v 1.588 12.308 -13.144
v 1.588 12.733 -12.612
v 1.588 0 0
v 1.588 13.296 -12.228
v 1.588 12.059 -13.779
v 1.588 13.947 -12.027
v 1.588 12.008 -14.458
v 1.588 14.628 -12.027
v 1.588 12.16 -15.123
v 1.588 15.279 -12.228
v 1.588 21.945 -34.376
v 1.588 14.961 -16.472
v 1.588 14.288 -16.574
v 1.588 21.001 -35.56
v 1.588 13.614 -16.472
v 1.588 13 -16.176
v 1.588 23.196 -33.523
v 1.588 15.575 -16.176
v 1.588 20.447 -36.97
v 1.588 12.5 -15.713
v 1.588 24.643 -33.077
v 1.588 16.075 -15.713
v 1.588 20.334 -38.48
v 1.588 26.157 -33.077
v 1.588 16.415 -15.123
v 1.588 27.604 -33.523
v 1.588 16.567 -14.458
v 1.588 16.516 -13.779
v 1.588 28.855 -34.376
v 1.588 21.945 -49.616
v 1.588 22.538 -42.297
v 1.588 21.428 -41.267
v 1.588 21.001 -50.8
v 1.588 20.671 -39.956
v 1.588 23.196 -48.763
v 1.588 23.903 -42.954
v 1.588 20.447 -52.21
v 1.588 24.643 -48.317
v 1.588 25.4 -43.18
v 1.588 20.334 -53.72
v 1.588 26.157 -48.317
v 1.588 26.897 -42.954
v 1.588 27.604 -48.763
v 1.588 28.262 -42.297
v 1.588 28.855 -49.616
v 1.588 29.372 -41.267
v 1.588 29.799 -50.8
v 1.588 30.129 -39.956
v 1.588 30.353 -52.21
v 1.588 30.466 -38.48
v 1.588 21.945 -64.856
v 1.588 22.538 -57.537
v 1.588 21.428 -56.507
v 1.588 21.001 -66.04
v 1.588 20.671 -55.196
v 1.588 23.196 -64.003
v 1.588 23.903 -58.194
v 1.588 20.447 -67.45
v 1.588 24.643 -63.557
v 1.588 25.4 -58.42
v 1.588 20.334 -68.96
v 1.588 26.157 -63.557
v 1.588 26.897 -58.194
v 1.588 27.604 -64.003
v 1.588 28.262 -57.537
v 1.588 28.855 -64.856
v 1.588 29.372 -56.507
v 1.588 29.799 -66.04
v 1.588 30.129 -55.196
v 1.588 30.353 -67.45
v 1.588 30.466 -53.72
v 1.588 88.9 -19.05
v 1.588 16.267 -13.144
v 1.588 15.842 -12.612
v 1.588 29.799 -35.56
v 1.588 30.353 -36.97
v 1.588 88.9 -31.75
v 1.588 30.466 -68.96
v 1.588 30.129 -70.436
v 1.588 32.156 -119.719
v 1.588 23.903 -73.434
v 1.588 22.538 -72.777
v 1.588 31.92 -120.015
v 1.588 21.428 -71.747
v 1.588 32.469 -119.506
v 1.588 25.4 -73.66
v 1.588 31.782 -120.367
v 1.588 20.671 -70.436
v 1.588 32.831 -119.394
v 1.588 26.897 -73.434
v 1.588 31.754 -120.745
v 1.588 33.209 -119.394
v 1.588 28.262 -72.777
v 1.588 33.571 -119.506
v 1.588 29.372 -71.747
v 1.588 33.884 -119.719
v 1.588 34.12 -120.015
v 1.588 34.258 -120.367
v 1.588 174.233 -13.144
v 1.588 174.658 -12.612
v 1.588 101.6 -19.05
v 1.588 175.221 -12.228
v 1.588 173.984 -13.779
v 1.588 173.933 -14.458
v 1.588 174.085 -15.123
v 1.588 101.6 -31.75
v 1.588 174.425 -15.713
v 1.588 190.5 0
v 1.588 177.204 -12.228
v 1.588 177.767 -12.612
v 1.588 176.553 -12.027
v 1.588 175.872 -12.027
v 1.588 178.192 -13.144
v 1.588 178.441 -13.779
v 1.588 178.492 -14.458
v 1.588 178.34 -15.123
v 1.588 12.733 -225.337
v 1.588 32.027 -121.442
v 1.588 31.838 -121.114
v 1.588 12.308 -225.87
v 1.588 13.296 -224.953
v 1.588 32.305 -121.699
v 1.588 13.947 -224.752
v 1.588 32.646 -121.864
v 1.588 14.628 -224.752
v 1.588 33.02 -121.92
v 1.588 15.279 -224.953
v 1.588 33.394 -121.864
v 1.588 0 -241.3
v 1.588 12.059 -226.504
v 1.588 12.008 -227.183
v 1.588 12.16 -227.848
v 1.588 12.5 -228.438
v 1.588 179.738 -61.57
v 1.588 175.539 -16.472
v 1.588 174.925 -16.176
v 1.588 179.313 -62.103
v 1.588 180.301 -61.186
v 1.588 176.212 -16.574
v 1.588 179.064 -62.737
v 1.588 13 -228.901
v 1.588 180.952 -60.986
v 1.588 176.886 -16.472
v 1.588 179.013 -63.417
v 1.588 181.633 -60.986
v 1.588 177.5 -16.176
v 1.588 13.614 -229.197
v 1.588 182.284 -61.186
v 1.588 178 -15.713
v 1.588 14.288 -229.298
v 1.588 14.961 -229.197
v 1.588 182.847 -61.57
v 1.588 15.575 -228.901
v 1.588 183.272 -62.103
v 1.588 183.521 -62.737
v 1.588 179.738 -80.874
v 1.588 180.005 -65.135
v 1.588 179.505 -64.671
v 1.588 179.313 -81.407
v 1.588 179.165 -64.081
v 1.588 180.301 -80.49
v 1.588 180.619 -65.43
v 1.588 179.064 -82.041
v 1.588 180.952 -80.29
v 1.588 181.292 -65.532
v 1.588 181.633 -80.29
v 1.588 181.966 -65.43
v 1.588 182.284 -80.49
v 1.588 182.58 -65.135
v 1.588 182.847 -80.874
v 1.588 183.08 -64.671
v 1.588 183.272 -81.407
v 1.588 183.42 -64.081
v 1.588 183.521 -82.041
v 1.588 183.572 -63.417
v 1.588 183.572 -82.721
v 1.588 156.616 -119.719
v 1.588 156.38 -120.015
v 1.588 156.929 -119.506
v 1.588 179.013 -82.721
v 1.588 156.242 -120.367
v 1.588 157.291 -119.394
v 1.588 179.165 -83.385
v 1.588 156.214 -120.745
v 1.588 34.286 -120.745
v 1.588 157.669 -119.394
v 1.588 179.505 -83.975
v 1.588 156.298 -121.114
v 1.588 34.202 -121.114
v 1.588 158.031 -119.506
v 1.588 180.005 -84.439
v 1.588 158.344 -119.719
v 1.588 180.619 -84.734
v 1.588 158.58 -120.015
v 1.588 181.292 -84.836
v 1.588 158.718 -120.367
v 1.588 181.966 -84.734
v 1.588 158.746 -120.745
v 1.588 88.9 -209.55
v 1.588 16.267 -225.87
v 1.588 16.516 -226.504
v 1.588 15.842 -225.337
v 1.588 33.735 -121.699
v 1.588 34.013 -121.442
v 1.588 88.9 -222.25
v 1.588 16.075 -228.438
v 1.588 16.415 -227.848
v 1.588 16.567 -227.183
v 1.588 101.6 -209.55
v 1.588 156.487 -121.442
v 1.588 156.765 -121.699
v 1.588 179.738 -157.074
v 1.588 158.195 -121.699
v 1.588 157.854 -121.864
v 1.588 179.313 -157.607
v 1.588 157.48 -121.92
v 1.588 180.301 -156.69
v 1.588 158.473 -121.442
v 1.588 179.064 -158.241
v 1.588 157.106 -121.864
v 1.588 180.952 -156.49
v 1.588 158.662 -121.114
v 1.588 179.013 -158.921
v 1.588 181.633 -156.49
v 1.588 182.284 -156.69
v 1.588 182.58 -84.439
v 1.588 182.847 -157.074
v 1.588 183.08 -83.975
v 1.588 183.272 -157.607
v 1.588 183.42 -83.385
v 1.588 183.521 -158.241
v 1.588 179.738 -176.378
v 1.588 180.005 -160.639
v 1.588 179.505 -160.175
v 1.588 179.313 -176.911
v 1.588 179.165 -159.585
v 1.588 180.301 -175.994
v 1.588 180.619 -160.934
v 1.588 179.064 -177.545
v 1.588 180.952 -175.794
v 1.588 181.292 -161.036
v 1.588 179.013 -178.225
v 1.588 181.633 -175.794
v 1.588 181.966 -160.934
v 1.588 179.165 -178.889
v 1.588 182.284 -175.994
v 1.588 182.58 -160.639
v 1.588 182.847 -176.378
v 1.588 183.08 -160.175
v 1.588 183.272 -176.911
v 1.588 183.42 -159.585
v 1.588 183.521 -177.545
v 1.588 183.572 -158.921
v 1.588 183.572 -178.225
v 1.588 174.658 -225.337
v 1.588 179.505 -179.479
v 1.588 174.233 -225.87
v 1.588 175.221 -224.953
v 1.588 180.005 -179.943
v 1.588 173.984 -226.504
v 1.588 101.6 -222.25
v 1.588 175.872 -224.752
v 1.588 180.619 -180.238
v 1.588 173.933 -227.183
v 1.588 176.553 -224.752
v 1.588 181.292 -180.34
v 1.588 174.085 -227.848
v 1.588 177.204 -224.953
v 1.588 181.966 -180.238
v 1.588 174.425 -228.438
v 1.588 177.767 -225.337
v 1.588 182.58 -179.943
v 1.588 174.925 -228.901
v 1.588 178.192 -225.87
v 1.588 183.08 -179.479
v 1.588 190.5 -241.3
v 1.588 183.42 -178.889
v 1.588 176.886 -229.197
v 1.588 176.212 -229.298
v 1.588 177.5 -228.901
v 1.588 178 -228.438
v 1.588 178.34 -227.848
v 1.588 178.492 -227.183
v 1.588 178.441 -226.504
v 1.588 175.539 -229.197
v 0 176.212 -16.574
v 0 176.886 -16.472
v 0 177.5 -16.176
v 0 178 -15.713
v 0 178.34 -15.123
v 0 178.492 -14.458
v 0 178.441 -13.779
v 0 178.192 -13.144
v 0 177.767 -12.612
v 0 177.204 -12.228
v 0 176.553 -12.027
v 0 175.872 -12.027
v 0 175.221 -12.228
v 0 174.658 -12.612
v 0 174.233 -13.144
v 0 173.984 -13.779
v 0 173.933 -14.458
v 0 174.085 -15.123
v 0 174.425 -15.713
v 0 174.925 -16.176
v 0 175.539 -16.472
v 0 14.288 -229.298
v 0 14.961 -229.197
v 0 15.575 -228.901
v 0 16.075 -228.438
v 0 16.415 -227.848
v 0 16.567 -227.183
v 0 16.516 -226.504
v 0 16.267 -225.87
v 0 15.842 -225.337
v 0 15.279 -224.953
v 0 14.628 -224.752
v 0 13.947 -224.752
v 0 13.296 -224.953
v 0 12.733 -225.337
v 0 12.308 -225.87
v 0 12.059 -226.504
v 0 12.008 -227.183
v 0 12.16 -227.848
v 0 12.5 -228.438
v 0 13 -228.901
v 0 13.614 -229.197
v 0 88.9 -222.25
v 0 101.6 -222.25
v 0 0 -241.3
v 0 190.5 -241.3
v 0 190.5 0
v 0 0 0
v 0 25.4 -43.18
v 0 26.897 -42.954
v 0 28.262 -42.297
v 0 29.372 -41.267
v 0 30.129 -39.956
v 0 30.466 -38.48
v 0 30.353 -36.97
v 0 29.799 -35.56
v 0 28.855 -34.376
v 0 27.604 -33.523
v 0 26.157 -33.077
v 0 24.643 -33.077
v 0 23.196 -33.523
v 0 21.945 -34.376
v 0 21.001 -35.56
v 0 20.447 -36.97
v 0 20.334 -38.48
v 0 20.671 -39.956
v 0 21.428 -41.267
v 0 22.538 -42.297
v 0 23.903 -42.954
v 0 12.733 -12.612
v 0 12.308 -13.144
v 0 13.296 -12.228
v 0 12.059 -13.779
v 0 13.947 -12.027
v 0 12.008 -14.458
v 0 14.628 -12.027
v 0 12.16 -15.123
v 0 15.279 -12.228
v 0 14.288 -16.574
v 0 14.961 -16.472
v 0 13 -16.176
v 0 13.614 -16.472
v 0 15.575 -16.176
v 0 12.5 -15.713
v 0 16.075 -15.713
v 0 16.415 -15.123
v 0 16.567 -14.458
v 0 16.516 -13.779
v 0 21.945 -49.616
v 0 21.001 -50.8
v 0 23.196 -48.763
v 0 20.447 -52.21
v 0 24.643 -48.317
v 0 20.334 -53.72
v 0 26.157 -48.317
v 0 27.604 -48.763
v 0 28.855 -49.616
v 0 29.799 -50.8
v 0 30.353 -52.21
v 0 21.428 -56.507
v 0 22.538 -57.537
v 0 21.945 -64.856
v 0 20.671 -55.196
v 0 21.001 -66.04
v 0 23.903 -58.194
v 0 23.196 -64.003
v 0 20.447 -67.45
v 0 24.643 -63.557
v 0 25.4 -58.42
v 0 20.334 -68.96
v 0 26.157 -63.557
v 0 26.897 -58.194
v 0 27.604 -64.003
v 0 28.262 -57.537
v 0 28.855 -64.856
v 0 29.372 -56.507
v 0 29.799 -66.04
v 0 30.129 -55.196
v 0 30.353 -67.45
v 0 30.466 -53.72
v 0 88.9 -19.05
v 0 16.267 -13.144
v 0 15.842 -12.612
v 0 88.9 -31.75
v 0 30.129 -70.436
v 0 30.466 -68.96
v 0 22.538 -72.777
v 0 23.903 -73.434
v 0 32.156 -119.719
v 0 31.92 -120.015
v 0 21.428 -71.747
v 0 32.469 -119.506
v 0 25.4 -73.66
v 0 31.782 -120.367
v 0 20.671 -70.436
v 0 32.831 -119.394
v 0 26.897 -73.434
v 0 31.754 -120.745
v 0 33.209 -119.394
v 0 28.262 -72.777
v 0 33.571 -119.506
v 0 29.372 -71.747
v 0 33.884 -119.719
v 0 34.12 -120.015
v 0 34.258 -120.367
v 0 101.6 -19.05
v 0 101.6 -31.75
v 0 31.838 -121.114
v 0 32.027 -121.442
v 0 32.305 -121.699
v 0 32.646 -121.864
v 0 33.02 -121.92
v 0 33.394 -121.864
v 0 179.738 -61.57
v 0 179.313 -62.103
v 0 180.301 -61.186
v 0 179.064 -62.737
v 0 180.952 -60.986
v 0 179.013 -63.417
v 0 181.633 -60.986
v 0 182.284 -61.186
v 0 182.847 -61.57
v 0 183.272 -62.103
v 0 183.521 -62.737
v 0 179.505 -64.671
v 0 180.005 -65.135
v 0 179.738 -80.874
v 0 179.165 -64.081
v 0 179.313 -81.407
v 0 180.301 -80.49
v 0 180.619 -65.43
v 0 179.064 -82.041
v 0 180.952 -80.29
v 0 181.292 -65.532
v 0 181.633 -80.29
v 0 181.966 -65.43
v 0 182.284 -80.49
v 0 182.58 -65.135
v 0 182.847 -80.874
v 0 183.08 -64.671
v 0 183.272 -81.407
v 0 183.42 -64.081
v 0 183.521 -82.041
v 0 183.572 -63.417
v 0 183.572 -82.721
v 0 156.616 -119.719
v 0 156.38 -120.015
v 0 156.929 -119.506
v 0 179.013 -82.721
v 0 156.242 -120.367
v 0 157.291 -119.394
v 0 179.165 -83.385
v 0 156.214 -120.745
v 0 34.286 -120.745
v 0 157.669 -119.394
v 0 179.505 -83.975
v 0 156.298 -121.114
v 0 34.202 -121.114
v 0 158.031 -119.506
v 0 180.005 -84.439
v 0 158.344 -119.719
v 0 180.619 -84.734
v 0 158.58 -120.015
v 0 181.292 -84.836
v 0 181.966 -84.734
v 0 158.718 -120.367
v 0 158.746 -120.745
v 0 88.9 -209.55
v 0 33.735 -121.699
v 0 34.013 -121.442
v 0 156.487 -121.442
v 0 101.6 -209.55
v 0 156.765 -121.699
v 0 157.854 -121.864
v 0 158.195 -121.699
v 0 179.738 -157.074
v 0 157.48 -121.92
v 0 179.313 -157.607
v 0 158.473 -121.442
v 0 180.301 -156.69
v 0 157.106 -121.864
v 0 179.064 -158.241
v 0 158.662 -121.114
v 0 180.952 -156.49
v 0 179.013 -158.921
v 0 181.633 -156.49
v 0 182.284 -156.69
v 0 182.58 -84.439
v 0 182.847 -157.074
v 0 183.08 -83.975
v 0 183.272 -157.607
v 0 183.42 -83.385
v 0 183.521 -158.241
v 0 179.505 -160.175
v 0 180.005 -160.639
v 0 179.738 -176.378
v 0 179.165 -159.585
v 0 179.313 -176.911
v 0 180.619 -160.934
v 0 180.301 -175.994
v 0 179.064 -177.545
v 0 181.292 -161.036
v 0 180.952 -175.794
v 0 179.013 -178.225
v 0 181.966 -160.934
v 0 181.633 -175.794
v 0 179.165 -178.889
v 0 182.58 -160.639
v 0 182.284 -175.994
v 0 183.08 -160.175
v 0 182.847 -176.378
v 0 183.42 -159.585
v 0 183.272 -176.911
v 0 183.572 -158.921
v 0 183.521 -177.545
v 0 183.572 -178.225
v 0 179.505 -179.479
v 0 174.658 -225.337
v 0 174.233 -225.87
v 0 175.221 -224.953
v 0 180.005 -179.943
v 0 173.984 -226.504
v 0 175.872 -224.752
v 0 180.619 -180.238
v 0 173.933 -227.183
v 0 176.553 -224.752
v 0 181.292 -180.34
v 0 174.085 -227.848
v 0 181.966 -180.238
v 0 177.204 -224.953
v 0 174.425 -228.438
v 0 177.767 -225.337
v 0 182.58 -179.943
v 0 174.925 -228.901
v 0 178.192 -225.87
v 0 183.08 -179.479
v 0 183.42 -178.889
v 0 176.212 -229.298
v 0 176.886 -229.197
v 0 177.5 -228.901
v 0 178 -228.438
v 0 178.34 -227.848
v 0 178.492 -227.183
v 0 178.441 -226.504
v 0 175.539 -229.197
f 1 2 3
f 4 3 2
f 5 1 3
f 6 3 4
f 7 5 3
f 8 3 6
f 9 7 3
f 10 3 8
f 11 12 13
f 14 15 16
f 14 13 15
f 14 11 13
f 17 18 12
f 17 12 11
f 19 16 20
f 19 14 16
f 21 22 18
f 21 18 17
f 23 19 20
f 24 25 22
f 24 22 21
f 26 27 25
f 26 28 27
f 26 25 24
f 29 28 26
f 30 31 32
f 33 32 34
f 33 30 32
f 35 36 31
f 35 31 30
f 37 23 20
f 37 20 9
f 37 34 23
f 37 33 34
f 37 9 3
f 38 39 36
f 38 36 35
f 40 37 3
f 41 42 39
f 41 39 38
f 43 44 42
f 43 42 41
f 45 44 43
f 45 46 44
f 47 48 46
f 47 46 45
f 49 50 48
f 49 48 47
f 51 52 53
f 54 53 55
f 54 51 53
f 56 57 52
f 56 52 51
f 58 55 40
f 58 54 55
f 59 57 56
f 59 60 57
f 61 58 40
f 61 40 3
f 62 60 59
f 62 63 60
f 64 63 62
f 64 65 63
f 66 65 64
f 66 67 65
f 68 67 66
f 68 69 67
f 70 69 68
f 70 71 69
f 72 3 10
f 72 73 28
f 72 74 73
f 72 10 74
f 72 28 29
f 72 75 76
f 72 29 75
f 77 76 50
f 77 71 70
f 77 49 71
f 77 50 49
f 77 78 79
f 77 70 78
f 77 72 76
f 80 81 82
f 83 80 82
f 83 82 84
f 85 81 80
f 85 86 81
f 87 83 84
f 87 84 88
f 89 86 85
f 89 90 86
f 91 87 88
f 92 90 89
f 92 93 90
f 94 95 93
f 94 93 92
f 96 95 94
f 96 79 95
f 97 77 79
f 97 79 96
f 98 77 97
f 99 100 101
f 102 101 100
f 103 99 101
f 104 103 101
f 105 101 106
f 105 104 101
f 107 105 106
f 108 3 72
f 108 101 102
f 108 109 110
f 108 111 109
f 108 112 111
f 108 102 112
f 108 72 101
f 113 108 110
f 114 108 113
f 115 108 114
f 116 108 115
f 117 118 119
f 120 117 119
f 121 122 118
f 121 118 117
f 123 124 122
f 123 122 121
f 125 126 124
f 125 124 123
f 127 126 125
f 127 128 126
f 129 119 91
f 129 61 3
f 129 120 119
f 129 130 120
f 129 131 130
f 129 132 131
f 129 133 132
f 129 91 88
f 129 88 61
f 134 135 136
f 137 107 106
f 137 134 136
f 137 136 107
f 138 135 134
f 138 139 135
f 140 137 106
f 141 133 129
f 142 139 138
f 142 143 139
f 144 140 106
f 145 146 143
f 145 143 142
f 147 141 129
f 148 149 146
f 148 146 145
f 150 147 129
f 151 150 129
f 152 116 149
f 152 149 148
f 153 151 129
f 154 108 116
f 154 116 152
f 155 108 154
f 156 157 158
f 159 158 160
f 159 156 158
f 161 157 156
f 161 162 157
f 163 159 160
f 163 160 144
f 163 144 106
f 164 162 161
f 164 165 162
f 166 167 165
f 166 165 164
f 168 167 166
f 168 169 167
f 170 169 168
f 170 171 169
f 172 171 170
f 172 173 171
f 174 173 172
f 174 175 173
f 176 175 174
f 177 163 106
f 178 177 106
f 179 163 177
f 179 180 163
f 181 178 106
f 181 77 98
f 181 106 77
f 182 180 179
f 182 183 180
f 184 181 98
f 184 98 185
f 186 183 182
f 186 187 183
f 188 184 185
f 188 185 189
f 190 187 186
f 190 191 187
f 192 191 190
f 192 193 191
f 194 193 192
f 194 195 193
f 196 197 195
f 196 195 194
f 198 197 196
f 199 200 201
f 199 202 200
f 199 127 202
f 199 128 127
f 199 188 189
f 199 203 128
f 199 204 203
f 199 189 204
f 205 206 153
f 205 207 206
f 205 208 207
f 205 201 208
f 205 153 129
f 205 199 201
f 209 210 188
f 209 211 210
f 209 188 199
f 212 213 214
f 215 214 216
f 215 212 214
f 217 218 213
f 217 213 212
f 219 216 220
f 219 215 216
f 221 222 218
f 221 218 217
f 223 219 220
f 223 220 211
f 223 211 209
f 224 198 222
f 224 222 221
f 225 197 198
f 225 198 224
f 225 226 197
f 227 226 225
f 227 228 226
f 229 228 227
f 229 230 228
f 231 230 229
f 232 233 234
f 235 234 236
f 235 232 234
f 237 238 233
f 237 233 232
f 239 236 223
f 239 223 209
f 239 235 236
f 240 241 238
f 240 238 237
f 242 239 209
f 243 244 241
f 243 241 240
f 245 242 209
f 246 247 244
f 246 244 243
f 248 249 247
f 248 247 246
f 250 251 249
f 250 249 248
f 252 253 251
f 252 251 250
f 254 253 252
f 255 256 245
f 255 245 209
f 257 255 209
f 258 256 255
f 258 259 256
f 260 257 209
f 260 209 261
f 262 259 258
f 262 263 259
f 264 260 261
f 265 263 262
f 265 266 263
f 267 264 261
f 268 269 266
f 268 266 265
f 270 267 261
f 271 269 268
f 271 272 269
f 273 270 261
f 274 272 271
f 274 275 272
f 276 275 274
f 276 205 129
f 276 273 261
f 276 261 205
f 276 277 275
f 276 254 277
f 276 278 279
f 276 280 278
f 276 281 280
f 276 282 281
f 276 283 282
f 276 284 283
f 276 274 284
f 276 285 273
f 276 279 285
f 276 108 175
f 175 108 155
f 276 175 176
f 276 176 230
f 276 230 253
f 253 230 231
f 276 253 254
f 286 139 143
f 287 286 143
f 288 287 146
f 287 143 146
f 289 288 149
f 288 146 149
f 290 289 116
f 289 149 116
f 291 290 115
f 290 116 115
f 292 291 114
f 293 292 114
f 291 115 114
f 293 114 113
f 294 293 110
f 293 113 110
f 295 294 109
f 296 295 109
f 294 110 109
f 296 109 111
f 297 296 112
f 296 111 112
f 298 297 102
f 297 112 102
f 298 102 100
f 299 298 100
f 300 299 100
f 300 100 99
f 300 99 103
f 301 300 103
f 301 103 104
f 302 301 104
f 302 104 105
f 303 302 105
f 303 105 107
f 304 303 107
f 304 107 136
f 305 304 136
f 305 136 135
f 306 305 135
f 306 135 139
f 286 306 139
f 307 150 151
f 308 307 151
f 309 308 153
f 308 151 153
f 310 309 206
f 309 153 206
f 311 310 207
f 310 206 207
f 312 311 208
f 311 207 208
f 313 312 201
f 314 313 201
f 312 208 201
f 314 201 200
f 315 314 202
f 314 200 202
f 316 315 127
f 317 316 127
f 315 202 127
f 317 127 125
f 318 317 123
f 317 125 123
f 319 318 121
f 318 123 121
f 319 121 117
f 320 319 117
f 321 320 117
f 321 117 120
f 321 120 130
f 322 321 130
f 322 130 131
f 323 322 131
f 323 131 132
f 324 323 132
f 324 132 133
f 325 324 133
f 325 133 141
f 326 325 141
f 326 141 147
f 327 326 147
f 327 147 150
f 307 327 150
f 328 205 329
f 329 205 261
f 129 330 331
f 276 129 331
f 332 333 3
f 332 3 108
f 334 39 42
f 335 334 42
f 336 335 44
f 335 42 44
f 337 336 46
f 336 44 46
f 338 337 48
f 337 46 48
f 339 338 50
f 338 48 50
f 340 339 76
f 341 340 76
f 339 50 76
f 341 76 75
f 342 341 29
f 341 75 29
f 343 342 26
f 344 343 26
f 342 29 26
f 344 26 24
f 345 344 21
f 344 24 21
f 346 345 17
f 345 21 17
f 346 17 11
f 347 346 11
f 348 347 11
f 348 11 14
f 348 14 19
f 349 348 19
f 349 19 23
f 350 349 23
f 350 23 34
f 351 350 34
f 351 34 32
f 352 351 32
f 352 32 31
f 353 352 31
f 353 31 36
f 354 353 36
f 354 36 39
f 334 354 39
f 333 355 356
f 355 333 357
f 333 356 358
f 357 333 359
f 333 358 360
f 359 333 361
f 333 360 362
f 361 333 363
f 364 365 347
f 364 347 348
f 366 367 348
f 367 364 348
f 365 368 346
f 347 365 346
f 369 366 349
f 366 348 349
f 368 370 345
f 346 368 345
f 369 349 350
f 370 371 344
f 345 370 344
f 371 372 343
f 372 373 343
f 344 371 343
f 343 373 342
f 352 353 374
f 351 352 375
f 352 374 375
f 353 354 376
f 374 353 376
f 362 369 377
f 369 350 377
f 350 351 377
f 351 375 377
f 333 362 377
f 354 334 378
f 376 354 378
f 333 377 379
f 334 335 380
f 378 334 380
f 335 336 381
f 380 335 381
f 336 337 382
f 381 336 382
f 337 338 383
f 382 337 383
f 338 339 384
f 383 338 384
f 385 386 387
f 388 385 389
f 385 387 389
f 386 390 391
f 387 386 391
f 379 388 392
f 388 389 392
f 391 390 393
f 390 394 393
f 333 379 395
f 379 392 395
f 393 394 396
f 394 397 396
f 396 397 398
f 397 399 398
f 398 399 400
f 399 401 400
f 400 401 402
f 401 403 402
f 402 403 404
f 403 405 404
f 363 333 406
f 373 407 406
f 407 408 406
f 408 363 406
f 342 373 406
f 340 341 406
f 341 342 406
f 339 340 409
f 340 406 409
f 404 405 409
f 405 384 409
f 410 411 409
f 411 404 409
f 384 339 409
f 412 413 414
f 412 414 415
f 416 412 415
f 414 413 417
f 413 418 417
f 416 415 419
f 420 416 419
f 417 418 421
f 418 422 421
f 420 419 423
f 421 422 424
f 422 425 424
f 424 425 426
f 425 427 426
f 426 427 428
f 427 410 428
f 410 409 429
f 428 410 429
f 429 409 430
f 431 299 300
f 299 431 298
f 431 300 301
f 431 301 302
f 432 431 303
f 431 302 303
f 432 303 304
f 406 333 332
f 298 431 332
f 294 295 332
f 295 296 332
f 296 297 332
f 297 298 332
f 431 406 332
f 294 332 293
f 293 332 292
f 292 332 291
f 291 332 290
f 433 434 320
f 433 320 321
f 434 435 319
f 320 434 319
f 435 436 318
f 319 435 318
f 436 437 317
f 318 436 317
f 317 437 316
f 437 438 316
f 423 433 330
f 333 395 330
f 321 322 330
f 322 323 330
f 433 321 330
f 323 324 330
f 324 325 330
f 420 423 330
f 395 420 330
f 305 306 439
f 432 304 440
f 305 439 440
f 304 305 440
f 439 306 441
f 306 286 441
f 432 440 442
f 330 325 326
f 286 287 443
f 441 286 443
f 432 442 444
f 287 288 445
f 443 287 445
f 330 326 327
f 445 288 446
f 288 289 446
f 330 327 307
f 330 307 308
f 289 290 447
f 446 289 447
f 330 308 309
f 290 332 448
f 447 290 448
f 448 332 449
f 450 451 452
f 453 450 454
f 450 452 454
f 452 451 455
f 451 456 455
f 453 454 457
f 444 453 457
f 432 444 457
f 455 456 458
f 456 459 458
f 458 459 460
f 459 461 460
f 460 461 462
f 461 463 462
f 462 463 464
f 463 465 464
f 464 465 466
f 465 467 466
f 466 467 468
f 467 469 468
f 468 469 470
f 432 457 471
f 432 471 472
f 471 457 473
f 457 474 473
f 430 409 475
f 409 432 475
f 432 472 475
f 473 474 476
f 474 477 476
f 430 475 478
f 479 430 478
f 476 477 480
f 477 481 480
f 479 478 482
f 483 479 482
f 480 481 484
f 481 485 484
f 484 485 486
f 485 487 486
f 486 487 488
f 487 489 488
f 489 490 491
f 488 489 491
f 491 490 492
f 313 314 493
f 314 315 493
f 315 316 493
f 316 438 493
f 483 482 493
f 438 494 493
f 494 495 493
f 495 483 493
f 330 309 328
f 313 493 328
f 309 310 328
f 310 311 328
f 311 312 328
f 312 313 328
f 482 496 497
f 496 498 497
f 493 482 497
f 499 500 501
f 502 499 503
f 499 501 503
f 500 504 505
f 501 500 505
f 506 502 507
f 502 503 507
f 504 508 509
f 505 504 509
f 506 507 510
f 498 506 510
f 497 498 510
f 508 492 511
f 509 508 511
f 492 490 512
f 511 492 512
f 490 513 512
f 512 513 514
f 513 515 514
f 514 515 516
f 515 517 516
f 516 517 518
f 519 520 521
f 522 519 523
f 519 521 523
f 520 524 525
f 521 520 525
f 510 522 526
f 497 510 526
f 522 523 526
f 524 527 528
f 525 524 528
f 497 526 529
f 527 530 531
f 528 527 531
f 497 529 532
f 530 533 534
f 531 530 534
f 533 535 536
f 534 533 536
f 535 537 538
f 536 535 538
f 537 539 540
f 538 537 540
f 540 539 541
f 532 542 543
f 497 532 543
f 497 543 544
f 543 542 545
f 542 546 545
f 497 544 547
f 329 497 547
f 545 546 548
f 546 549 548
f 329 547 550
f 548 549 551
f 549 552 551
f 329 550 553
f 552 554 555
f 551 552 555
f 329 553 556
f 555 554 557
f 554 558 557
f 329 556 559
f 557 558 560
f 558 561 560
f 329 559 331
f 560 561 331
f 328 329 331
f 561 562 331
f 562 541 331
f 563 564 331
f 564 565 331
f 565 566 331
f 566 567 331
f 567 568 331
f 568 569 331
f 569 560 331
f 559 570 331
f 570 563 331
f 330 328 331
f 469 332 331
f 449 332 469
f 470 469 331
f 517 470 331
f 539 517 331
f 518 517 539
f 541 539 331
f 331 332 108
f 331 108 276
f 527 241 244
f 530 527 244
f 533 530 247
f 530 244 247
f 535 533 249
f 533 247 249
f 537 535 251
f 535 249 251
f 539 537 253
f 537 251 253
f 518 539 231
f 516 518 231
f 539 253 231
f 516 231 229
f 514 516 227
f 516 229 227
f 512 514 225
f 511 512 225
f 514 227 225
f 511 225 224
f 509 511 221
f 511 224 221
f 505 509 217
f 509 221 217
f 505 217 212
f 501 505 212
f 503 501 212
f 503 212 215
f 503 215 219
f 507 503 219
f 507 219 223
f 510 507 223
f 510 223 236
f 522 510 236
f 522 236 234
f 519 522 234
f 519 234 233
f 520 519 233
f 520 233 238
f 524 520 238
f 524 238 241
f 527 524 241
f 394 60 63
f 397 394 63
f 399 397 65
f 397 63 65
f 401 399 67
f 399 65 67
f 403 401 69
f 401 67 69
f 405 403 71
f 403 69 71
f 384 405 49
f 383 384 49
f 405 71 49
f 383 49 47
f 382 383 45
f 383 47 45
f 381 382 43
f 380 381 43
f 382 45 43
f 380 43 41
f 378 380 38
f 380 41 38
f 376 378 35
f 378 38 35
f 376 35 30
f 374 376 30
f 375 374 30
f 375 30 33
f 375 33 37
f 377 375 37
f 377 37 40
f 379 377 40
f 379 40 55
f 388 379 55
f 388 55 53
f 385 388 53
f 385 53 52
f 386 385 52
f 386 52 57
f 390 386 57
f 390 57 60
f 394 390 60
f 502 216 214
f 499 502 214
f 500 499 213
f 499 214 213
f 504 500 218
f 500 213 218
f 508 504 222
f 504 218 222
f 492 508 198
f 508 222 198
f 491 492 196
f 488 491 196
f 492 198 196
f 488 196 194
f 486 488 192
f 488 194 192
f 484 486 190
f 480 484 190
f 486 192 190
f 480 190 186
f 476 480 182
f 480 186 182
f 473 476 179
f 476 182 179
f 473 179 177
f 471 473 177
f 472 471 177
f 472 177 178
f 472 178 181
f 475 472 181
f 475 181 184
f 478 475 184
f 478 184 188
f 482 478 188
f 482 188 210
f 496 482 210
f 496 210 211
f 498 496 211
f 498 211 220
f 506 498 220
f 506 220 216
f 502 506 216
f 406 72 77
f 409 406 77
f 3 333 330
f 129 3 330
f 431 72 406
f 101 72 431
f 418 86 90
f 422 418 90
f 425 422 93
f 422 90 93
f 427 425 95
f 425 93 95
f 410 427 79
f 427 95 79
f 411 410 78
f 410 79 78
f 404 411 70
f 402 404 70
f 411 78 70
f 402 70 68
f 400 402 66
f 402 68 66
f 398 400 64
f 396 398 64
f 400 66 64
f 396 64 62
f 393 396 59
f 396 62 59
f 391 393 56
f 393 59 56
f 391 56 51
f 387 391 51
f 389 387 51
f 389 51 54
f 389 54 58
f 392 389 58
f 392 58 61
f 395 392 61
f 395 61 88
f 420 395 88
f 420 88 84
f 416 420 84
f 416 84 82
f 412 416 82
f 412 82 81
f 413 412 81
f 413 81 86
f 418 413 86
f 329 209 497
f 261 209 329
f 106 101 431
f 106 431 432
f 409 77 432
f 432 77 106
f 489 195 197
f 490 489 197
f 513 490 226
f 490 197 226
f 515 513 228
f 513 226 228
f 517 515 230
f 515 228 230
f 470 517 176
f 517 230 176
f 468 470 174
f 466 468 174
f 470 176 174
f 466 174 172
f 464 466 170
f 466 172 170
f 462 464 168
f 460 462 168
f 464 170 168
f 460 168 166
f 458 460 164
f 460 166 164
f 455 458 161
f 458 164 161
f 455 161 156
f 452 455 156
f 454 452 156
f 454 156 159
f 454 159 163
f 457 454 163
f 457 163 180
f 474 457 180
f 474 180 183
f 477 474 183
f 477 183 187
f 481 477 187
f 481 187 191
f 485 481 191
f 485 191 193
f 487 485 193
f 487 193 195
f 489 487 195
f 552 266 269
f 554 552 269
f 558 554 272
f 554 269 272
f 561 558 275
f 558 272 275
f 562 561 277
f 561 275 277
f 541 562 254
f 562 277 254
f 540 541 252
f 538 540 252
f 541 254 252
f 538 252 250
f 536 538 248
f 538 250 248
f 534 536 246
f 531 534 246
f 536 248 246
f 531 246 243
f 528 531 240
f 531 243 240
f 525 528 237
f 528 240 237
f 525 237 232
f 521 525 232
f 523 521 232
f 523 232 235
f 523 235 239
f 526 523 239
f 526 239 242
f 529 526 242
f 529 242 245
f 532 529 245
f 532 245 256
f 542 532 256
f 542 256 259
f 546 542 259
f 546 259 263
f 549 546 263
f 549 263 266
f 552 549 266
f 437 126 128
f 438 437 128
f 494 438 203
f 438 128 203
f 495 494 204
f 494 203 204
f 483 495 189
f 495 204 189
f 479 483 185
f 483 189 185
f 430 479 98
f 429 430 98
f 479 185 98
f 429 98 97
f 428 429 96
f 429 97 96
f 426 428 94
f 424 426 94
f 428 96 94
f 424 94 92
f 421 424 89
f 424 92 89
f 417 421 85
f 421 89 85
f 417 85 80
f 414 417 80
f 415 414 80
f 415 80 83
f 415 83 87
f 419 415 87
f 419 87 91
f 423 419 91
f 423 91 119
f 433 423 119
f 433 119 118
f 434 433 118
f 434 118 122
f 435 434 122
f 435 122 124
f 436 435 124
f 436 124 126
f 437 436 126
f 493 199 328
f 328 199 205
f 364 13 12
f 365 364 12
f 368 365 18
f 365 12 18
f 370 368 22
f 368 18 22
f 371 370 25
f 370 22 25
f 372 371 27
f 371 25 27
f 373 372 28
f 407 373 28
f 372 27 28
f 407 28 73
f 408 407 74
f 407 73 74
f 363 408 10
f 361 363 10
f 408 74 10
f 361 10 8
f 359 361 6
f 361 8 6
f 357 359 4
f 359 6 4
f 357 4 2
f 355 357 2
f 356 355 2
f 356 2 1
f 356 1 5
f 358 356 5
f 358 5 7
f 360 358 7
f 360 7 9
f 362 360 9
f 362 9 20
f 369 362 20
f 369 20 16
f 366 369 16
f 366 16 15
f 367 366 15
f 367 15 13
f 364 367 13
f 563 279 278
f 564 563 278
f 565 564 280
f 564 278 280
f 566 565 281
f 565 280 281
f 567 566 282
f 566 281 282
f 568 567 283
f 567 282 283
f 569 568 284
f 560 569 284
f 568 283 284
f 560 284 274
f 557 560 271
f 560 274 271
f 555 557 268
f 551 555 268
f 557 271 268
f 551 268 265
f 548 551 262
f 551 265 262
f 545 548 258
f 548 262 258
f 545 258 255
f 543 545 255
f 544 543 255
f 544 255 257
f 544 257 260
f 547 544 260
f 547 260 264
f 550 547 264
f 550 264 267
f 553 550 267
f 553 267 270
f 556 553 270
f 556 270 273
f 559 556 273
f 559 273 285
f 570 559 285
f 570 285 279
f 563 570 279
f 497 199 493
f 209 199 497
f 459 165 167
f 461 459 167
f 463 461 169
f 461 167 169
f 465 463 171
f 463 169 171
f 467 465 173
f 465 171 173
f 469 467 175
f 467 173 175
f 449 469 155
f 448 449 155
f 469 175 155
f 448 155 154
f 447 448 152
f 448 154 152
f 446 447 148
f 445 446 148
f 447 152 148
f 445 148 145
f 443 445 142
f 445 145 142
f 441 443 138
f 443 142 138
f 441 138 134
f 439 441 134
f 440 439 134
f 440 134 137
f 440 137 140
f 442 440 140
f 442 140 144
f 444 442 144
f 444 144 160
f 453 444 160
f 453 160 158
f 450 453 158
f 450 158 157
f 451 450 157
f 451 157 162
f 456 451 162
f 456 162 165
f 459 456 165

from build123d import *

# Parameters (mm, degrees)
SKETCH1_W                     = 241.3
SKETCH1_H                     = 190.5
MAIN_BODY_DEPTH               = 1.5875
SKETCH2_R                     = 2.286
BOLT_HOLES_DEPTH              = 2.5875
SKETCH3_R                     = 2.286
LOCKING_MECHANISM_HOLES_DEPTH = 2.5875
SKETCH4_W                     = 12.7
SKETCH4_H                     = 12.7
LED_HOLES_DEPTH               = 2.5875
SKETCH5_R                     = 1.27
LOGO_MOUNT_HOLES_DEPTH        = 2.5875
SKETCH6_R                     = 5.08
PANEL_MOUNT_LED_HOLE_DEPTH    = 2.5875


with BuildPart() as part:
    # Sketch1 → Main Body (new body)
    with BuildSketch(Plane(origin=(0, 0, 0), x_dir=(0, 0, -1), z_dir=(1, 0, 0))):
        with Locations((120.65, 95.25)):
            Rectangle(SKETCH1_W, SKETCH1_H)
    extrude(amount=MAIN_BODY_DEPTH)

    # Sketch2 → Bolt Holes (cut, through all)
    with BuildSketch(Plane(origin=(1.5875, 0, 0), x_dir=(0, 0, -1), z_dir=(1, 0, 0))):
        with Locations((227.0125, 14.2875)):
            Circle(SKETCH2_R)
        with Locations((227.0125, 176.2125)):
            Circle(SKETCH2_R)
        with Locations((14.2875, 14.2875)):
            Circle(SKETCH2_R)
        with Locations((14.2875, 176.2125)):
            Circle(SKETCH2_R)
    extrude(amount=-BOLT_HOLES_DEPTH, mode=Mode.SUBTRACT)

    # Sketch3 → Locking Mechanism Holes (cut, through all)
    with BuildSketch(Plane(origin=(1.5875, 0, 0), x_dir=(0, 0, -1), z_dir=(1, 0, 0))):
        with Locations((63.246, 181.2925)):
            Circle(SKETCH3_R)
        with Locations((82.55, 181.2925)):
            Circle(SKETCH3_R)
        with Locations((158.75, 181.2925)):
            Circle(SKETCH3_R)
        with Locations((178.054, 181.2925)):
            Circle(SKETCH3_R)
    extrude(amount=-LOCKING_MECHANISM_HOLES_DEPTH, mode=Mode.SUBTRACT)

    # Sketch4 → LED Holes (cut, through all)
    with BuildSketch(Plane(origin=(1.5875, 0, 0), x_dir=(0, 0, -1), z_dir=(1, 0, 0))):
        with Locations((25.4, 95.25)):
            Rectangle(SKETCH4_W, SKETCH4_H)
        with Locations((215.9, 95.25)):
            Rectangle(SKETCH4_W, SKETCH4_H)
    extrude(amount=-LED_HOLES_DEPTH, mode=Mode.SUBTRACT)

    # Sketch5 → Logo Mount Holes (cut, through all)
    with BuildSketch(Plane(origin=(1.5875, 0, 0), x_dir=(0, 0, -1), z_dir=(1, 0, 0))):
        with Locations((120.65, 157.48)):
            Circle(SKETCH5_R)
        with Locations((120.65, 33.02)):
            Circle(SKETCH5_R)
    extrude(amount=-LOGO_MOUNT_HOLES_DEPTH, mode=Mode.SUBTRACT)

    # Sketch6 → Panel Mount LED Hole (cut, through all)
    with BuildSketch(Plane(origin=(1.5875, 0, 0), x_dir=(0, 0, -1), z_dir=(1, 0, 0))):
        with Locations((38.1, 25.4)):
            Circle(SKETCH6_R)
        with Locations((53.34, 25.4)):
            Circle(SKETCH6_R)
        with Locations((68.58, 25.4)):
            Circle(SKETCH6_R)
    extrude(amount=-PANEL_MOUNT_LED_HOLE_DEPTH, mode=Mode.SUBTRACT)


solid = part.part
